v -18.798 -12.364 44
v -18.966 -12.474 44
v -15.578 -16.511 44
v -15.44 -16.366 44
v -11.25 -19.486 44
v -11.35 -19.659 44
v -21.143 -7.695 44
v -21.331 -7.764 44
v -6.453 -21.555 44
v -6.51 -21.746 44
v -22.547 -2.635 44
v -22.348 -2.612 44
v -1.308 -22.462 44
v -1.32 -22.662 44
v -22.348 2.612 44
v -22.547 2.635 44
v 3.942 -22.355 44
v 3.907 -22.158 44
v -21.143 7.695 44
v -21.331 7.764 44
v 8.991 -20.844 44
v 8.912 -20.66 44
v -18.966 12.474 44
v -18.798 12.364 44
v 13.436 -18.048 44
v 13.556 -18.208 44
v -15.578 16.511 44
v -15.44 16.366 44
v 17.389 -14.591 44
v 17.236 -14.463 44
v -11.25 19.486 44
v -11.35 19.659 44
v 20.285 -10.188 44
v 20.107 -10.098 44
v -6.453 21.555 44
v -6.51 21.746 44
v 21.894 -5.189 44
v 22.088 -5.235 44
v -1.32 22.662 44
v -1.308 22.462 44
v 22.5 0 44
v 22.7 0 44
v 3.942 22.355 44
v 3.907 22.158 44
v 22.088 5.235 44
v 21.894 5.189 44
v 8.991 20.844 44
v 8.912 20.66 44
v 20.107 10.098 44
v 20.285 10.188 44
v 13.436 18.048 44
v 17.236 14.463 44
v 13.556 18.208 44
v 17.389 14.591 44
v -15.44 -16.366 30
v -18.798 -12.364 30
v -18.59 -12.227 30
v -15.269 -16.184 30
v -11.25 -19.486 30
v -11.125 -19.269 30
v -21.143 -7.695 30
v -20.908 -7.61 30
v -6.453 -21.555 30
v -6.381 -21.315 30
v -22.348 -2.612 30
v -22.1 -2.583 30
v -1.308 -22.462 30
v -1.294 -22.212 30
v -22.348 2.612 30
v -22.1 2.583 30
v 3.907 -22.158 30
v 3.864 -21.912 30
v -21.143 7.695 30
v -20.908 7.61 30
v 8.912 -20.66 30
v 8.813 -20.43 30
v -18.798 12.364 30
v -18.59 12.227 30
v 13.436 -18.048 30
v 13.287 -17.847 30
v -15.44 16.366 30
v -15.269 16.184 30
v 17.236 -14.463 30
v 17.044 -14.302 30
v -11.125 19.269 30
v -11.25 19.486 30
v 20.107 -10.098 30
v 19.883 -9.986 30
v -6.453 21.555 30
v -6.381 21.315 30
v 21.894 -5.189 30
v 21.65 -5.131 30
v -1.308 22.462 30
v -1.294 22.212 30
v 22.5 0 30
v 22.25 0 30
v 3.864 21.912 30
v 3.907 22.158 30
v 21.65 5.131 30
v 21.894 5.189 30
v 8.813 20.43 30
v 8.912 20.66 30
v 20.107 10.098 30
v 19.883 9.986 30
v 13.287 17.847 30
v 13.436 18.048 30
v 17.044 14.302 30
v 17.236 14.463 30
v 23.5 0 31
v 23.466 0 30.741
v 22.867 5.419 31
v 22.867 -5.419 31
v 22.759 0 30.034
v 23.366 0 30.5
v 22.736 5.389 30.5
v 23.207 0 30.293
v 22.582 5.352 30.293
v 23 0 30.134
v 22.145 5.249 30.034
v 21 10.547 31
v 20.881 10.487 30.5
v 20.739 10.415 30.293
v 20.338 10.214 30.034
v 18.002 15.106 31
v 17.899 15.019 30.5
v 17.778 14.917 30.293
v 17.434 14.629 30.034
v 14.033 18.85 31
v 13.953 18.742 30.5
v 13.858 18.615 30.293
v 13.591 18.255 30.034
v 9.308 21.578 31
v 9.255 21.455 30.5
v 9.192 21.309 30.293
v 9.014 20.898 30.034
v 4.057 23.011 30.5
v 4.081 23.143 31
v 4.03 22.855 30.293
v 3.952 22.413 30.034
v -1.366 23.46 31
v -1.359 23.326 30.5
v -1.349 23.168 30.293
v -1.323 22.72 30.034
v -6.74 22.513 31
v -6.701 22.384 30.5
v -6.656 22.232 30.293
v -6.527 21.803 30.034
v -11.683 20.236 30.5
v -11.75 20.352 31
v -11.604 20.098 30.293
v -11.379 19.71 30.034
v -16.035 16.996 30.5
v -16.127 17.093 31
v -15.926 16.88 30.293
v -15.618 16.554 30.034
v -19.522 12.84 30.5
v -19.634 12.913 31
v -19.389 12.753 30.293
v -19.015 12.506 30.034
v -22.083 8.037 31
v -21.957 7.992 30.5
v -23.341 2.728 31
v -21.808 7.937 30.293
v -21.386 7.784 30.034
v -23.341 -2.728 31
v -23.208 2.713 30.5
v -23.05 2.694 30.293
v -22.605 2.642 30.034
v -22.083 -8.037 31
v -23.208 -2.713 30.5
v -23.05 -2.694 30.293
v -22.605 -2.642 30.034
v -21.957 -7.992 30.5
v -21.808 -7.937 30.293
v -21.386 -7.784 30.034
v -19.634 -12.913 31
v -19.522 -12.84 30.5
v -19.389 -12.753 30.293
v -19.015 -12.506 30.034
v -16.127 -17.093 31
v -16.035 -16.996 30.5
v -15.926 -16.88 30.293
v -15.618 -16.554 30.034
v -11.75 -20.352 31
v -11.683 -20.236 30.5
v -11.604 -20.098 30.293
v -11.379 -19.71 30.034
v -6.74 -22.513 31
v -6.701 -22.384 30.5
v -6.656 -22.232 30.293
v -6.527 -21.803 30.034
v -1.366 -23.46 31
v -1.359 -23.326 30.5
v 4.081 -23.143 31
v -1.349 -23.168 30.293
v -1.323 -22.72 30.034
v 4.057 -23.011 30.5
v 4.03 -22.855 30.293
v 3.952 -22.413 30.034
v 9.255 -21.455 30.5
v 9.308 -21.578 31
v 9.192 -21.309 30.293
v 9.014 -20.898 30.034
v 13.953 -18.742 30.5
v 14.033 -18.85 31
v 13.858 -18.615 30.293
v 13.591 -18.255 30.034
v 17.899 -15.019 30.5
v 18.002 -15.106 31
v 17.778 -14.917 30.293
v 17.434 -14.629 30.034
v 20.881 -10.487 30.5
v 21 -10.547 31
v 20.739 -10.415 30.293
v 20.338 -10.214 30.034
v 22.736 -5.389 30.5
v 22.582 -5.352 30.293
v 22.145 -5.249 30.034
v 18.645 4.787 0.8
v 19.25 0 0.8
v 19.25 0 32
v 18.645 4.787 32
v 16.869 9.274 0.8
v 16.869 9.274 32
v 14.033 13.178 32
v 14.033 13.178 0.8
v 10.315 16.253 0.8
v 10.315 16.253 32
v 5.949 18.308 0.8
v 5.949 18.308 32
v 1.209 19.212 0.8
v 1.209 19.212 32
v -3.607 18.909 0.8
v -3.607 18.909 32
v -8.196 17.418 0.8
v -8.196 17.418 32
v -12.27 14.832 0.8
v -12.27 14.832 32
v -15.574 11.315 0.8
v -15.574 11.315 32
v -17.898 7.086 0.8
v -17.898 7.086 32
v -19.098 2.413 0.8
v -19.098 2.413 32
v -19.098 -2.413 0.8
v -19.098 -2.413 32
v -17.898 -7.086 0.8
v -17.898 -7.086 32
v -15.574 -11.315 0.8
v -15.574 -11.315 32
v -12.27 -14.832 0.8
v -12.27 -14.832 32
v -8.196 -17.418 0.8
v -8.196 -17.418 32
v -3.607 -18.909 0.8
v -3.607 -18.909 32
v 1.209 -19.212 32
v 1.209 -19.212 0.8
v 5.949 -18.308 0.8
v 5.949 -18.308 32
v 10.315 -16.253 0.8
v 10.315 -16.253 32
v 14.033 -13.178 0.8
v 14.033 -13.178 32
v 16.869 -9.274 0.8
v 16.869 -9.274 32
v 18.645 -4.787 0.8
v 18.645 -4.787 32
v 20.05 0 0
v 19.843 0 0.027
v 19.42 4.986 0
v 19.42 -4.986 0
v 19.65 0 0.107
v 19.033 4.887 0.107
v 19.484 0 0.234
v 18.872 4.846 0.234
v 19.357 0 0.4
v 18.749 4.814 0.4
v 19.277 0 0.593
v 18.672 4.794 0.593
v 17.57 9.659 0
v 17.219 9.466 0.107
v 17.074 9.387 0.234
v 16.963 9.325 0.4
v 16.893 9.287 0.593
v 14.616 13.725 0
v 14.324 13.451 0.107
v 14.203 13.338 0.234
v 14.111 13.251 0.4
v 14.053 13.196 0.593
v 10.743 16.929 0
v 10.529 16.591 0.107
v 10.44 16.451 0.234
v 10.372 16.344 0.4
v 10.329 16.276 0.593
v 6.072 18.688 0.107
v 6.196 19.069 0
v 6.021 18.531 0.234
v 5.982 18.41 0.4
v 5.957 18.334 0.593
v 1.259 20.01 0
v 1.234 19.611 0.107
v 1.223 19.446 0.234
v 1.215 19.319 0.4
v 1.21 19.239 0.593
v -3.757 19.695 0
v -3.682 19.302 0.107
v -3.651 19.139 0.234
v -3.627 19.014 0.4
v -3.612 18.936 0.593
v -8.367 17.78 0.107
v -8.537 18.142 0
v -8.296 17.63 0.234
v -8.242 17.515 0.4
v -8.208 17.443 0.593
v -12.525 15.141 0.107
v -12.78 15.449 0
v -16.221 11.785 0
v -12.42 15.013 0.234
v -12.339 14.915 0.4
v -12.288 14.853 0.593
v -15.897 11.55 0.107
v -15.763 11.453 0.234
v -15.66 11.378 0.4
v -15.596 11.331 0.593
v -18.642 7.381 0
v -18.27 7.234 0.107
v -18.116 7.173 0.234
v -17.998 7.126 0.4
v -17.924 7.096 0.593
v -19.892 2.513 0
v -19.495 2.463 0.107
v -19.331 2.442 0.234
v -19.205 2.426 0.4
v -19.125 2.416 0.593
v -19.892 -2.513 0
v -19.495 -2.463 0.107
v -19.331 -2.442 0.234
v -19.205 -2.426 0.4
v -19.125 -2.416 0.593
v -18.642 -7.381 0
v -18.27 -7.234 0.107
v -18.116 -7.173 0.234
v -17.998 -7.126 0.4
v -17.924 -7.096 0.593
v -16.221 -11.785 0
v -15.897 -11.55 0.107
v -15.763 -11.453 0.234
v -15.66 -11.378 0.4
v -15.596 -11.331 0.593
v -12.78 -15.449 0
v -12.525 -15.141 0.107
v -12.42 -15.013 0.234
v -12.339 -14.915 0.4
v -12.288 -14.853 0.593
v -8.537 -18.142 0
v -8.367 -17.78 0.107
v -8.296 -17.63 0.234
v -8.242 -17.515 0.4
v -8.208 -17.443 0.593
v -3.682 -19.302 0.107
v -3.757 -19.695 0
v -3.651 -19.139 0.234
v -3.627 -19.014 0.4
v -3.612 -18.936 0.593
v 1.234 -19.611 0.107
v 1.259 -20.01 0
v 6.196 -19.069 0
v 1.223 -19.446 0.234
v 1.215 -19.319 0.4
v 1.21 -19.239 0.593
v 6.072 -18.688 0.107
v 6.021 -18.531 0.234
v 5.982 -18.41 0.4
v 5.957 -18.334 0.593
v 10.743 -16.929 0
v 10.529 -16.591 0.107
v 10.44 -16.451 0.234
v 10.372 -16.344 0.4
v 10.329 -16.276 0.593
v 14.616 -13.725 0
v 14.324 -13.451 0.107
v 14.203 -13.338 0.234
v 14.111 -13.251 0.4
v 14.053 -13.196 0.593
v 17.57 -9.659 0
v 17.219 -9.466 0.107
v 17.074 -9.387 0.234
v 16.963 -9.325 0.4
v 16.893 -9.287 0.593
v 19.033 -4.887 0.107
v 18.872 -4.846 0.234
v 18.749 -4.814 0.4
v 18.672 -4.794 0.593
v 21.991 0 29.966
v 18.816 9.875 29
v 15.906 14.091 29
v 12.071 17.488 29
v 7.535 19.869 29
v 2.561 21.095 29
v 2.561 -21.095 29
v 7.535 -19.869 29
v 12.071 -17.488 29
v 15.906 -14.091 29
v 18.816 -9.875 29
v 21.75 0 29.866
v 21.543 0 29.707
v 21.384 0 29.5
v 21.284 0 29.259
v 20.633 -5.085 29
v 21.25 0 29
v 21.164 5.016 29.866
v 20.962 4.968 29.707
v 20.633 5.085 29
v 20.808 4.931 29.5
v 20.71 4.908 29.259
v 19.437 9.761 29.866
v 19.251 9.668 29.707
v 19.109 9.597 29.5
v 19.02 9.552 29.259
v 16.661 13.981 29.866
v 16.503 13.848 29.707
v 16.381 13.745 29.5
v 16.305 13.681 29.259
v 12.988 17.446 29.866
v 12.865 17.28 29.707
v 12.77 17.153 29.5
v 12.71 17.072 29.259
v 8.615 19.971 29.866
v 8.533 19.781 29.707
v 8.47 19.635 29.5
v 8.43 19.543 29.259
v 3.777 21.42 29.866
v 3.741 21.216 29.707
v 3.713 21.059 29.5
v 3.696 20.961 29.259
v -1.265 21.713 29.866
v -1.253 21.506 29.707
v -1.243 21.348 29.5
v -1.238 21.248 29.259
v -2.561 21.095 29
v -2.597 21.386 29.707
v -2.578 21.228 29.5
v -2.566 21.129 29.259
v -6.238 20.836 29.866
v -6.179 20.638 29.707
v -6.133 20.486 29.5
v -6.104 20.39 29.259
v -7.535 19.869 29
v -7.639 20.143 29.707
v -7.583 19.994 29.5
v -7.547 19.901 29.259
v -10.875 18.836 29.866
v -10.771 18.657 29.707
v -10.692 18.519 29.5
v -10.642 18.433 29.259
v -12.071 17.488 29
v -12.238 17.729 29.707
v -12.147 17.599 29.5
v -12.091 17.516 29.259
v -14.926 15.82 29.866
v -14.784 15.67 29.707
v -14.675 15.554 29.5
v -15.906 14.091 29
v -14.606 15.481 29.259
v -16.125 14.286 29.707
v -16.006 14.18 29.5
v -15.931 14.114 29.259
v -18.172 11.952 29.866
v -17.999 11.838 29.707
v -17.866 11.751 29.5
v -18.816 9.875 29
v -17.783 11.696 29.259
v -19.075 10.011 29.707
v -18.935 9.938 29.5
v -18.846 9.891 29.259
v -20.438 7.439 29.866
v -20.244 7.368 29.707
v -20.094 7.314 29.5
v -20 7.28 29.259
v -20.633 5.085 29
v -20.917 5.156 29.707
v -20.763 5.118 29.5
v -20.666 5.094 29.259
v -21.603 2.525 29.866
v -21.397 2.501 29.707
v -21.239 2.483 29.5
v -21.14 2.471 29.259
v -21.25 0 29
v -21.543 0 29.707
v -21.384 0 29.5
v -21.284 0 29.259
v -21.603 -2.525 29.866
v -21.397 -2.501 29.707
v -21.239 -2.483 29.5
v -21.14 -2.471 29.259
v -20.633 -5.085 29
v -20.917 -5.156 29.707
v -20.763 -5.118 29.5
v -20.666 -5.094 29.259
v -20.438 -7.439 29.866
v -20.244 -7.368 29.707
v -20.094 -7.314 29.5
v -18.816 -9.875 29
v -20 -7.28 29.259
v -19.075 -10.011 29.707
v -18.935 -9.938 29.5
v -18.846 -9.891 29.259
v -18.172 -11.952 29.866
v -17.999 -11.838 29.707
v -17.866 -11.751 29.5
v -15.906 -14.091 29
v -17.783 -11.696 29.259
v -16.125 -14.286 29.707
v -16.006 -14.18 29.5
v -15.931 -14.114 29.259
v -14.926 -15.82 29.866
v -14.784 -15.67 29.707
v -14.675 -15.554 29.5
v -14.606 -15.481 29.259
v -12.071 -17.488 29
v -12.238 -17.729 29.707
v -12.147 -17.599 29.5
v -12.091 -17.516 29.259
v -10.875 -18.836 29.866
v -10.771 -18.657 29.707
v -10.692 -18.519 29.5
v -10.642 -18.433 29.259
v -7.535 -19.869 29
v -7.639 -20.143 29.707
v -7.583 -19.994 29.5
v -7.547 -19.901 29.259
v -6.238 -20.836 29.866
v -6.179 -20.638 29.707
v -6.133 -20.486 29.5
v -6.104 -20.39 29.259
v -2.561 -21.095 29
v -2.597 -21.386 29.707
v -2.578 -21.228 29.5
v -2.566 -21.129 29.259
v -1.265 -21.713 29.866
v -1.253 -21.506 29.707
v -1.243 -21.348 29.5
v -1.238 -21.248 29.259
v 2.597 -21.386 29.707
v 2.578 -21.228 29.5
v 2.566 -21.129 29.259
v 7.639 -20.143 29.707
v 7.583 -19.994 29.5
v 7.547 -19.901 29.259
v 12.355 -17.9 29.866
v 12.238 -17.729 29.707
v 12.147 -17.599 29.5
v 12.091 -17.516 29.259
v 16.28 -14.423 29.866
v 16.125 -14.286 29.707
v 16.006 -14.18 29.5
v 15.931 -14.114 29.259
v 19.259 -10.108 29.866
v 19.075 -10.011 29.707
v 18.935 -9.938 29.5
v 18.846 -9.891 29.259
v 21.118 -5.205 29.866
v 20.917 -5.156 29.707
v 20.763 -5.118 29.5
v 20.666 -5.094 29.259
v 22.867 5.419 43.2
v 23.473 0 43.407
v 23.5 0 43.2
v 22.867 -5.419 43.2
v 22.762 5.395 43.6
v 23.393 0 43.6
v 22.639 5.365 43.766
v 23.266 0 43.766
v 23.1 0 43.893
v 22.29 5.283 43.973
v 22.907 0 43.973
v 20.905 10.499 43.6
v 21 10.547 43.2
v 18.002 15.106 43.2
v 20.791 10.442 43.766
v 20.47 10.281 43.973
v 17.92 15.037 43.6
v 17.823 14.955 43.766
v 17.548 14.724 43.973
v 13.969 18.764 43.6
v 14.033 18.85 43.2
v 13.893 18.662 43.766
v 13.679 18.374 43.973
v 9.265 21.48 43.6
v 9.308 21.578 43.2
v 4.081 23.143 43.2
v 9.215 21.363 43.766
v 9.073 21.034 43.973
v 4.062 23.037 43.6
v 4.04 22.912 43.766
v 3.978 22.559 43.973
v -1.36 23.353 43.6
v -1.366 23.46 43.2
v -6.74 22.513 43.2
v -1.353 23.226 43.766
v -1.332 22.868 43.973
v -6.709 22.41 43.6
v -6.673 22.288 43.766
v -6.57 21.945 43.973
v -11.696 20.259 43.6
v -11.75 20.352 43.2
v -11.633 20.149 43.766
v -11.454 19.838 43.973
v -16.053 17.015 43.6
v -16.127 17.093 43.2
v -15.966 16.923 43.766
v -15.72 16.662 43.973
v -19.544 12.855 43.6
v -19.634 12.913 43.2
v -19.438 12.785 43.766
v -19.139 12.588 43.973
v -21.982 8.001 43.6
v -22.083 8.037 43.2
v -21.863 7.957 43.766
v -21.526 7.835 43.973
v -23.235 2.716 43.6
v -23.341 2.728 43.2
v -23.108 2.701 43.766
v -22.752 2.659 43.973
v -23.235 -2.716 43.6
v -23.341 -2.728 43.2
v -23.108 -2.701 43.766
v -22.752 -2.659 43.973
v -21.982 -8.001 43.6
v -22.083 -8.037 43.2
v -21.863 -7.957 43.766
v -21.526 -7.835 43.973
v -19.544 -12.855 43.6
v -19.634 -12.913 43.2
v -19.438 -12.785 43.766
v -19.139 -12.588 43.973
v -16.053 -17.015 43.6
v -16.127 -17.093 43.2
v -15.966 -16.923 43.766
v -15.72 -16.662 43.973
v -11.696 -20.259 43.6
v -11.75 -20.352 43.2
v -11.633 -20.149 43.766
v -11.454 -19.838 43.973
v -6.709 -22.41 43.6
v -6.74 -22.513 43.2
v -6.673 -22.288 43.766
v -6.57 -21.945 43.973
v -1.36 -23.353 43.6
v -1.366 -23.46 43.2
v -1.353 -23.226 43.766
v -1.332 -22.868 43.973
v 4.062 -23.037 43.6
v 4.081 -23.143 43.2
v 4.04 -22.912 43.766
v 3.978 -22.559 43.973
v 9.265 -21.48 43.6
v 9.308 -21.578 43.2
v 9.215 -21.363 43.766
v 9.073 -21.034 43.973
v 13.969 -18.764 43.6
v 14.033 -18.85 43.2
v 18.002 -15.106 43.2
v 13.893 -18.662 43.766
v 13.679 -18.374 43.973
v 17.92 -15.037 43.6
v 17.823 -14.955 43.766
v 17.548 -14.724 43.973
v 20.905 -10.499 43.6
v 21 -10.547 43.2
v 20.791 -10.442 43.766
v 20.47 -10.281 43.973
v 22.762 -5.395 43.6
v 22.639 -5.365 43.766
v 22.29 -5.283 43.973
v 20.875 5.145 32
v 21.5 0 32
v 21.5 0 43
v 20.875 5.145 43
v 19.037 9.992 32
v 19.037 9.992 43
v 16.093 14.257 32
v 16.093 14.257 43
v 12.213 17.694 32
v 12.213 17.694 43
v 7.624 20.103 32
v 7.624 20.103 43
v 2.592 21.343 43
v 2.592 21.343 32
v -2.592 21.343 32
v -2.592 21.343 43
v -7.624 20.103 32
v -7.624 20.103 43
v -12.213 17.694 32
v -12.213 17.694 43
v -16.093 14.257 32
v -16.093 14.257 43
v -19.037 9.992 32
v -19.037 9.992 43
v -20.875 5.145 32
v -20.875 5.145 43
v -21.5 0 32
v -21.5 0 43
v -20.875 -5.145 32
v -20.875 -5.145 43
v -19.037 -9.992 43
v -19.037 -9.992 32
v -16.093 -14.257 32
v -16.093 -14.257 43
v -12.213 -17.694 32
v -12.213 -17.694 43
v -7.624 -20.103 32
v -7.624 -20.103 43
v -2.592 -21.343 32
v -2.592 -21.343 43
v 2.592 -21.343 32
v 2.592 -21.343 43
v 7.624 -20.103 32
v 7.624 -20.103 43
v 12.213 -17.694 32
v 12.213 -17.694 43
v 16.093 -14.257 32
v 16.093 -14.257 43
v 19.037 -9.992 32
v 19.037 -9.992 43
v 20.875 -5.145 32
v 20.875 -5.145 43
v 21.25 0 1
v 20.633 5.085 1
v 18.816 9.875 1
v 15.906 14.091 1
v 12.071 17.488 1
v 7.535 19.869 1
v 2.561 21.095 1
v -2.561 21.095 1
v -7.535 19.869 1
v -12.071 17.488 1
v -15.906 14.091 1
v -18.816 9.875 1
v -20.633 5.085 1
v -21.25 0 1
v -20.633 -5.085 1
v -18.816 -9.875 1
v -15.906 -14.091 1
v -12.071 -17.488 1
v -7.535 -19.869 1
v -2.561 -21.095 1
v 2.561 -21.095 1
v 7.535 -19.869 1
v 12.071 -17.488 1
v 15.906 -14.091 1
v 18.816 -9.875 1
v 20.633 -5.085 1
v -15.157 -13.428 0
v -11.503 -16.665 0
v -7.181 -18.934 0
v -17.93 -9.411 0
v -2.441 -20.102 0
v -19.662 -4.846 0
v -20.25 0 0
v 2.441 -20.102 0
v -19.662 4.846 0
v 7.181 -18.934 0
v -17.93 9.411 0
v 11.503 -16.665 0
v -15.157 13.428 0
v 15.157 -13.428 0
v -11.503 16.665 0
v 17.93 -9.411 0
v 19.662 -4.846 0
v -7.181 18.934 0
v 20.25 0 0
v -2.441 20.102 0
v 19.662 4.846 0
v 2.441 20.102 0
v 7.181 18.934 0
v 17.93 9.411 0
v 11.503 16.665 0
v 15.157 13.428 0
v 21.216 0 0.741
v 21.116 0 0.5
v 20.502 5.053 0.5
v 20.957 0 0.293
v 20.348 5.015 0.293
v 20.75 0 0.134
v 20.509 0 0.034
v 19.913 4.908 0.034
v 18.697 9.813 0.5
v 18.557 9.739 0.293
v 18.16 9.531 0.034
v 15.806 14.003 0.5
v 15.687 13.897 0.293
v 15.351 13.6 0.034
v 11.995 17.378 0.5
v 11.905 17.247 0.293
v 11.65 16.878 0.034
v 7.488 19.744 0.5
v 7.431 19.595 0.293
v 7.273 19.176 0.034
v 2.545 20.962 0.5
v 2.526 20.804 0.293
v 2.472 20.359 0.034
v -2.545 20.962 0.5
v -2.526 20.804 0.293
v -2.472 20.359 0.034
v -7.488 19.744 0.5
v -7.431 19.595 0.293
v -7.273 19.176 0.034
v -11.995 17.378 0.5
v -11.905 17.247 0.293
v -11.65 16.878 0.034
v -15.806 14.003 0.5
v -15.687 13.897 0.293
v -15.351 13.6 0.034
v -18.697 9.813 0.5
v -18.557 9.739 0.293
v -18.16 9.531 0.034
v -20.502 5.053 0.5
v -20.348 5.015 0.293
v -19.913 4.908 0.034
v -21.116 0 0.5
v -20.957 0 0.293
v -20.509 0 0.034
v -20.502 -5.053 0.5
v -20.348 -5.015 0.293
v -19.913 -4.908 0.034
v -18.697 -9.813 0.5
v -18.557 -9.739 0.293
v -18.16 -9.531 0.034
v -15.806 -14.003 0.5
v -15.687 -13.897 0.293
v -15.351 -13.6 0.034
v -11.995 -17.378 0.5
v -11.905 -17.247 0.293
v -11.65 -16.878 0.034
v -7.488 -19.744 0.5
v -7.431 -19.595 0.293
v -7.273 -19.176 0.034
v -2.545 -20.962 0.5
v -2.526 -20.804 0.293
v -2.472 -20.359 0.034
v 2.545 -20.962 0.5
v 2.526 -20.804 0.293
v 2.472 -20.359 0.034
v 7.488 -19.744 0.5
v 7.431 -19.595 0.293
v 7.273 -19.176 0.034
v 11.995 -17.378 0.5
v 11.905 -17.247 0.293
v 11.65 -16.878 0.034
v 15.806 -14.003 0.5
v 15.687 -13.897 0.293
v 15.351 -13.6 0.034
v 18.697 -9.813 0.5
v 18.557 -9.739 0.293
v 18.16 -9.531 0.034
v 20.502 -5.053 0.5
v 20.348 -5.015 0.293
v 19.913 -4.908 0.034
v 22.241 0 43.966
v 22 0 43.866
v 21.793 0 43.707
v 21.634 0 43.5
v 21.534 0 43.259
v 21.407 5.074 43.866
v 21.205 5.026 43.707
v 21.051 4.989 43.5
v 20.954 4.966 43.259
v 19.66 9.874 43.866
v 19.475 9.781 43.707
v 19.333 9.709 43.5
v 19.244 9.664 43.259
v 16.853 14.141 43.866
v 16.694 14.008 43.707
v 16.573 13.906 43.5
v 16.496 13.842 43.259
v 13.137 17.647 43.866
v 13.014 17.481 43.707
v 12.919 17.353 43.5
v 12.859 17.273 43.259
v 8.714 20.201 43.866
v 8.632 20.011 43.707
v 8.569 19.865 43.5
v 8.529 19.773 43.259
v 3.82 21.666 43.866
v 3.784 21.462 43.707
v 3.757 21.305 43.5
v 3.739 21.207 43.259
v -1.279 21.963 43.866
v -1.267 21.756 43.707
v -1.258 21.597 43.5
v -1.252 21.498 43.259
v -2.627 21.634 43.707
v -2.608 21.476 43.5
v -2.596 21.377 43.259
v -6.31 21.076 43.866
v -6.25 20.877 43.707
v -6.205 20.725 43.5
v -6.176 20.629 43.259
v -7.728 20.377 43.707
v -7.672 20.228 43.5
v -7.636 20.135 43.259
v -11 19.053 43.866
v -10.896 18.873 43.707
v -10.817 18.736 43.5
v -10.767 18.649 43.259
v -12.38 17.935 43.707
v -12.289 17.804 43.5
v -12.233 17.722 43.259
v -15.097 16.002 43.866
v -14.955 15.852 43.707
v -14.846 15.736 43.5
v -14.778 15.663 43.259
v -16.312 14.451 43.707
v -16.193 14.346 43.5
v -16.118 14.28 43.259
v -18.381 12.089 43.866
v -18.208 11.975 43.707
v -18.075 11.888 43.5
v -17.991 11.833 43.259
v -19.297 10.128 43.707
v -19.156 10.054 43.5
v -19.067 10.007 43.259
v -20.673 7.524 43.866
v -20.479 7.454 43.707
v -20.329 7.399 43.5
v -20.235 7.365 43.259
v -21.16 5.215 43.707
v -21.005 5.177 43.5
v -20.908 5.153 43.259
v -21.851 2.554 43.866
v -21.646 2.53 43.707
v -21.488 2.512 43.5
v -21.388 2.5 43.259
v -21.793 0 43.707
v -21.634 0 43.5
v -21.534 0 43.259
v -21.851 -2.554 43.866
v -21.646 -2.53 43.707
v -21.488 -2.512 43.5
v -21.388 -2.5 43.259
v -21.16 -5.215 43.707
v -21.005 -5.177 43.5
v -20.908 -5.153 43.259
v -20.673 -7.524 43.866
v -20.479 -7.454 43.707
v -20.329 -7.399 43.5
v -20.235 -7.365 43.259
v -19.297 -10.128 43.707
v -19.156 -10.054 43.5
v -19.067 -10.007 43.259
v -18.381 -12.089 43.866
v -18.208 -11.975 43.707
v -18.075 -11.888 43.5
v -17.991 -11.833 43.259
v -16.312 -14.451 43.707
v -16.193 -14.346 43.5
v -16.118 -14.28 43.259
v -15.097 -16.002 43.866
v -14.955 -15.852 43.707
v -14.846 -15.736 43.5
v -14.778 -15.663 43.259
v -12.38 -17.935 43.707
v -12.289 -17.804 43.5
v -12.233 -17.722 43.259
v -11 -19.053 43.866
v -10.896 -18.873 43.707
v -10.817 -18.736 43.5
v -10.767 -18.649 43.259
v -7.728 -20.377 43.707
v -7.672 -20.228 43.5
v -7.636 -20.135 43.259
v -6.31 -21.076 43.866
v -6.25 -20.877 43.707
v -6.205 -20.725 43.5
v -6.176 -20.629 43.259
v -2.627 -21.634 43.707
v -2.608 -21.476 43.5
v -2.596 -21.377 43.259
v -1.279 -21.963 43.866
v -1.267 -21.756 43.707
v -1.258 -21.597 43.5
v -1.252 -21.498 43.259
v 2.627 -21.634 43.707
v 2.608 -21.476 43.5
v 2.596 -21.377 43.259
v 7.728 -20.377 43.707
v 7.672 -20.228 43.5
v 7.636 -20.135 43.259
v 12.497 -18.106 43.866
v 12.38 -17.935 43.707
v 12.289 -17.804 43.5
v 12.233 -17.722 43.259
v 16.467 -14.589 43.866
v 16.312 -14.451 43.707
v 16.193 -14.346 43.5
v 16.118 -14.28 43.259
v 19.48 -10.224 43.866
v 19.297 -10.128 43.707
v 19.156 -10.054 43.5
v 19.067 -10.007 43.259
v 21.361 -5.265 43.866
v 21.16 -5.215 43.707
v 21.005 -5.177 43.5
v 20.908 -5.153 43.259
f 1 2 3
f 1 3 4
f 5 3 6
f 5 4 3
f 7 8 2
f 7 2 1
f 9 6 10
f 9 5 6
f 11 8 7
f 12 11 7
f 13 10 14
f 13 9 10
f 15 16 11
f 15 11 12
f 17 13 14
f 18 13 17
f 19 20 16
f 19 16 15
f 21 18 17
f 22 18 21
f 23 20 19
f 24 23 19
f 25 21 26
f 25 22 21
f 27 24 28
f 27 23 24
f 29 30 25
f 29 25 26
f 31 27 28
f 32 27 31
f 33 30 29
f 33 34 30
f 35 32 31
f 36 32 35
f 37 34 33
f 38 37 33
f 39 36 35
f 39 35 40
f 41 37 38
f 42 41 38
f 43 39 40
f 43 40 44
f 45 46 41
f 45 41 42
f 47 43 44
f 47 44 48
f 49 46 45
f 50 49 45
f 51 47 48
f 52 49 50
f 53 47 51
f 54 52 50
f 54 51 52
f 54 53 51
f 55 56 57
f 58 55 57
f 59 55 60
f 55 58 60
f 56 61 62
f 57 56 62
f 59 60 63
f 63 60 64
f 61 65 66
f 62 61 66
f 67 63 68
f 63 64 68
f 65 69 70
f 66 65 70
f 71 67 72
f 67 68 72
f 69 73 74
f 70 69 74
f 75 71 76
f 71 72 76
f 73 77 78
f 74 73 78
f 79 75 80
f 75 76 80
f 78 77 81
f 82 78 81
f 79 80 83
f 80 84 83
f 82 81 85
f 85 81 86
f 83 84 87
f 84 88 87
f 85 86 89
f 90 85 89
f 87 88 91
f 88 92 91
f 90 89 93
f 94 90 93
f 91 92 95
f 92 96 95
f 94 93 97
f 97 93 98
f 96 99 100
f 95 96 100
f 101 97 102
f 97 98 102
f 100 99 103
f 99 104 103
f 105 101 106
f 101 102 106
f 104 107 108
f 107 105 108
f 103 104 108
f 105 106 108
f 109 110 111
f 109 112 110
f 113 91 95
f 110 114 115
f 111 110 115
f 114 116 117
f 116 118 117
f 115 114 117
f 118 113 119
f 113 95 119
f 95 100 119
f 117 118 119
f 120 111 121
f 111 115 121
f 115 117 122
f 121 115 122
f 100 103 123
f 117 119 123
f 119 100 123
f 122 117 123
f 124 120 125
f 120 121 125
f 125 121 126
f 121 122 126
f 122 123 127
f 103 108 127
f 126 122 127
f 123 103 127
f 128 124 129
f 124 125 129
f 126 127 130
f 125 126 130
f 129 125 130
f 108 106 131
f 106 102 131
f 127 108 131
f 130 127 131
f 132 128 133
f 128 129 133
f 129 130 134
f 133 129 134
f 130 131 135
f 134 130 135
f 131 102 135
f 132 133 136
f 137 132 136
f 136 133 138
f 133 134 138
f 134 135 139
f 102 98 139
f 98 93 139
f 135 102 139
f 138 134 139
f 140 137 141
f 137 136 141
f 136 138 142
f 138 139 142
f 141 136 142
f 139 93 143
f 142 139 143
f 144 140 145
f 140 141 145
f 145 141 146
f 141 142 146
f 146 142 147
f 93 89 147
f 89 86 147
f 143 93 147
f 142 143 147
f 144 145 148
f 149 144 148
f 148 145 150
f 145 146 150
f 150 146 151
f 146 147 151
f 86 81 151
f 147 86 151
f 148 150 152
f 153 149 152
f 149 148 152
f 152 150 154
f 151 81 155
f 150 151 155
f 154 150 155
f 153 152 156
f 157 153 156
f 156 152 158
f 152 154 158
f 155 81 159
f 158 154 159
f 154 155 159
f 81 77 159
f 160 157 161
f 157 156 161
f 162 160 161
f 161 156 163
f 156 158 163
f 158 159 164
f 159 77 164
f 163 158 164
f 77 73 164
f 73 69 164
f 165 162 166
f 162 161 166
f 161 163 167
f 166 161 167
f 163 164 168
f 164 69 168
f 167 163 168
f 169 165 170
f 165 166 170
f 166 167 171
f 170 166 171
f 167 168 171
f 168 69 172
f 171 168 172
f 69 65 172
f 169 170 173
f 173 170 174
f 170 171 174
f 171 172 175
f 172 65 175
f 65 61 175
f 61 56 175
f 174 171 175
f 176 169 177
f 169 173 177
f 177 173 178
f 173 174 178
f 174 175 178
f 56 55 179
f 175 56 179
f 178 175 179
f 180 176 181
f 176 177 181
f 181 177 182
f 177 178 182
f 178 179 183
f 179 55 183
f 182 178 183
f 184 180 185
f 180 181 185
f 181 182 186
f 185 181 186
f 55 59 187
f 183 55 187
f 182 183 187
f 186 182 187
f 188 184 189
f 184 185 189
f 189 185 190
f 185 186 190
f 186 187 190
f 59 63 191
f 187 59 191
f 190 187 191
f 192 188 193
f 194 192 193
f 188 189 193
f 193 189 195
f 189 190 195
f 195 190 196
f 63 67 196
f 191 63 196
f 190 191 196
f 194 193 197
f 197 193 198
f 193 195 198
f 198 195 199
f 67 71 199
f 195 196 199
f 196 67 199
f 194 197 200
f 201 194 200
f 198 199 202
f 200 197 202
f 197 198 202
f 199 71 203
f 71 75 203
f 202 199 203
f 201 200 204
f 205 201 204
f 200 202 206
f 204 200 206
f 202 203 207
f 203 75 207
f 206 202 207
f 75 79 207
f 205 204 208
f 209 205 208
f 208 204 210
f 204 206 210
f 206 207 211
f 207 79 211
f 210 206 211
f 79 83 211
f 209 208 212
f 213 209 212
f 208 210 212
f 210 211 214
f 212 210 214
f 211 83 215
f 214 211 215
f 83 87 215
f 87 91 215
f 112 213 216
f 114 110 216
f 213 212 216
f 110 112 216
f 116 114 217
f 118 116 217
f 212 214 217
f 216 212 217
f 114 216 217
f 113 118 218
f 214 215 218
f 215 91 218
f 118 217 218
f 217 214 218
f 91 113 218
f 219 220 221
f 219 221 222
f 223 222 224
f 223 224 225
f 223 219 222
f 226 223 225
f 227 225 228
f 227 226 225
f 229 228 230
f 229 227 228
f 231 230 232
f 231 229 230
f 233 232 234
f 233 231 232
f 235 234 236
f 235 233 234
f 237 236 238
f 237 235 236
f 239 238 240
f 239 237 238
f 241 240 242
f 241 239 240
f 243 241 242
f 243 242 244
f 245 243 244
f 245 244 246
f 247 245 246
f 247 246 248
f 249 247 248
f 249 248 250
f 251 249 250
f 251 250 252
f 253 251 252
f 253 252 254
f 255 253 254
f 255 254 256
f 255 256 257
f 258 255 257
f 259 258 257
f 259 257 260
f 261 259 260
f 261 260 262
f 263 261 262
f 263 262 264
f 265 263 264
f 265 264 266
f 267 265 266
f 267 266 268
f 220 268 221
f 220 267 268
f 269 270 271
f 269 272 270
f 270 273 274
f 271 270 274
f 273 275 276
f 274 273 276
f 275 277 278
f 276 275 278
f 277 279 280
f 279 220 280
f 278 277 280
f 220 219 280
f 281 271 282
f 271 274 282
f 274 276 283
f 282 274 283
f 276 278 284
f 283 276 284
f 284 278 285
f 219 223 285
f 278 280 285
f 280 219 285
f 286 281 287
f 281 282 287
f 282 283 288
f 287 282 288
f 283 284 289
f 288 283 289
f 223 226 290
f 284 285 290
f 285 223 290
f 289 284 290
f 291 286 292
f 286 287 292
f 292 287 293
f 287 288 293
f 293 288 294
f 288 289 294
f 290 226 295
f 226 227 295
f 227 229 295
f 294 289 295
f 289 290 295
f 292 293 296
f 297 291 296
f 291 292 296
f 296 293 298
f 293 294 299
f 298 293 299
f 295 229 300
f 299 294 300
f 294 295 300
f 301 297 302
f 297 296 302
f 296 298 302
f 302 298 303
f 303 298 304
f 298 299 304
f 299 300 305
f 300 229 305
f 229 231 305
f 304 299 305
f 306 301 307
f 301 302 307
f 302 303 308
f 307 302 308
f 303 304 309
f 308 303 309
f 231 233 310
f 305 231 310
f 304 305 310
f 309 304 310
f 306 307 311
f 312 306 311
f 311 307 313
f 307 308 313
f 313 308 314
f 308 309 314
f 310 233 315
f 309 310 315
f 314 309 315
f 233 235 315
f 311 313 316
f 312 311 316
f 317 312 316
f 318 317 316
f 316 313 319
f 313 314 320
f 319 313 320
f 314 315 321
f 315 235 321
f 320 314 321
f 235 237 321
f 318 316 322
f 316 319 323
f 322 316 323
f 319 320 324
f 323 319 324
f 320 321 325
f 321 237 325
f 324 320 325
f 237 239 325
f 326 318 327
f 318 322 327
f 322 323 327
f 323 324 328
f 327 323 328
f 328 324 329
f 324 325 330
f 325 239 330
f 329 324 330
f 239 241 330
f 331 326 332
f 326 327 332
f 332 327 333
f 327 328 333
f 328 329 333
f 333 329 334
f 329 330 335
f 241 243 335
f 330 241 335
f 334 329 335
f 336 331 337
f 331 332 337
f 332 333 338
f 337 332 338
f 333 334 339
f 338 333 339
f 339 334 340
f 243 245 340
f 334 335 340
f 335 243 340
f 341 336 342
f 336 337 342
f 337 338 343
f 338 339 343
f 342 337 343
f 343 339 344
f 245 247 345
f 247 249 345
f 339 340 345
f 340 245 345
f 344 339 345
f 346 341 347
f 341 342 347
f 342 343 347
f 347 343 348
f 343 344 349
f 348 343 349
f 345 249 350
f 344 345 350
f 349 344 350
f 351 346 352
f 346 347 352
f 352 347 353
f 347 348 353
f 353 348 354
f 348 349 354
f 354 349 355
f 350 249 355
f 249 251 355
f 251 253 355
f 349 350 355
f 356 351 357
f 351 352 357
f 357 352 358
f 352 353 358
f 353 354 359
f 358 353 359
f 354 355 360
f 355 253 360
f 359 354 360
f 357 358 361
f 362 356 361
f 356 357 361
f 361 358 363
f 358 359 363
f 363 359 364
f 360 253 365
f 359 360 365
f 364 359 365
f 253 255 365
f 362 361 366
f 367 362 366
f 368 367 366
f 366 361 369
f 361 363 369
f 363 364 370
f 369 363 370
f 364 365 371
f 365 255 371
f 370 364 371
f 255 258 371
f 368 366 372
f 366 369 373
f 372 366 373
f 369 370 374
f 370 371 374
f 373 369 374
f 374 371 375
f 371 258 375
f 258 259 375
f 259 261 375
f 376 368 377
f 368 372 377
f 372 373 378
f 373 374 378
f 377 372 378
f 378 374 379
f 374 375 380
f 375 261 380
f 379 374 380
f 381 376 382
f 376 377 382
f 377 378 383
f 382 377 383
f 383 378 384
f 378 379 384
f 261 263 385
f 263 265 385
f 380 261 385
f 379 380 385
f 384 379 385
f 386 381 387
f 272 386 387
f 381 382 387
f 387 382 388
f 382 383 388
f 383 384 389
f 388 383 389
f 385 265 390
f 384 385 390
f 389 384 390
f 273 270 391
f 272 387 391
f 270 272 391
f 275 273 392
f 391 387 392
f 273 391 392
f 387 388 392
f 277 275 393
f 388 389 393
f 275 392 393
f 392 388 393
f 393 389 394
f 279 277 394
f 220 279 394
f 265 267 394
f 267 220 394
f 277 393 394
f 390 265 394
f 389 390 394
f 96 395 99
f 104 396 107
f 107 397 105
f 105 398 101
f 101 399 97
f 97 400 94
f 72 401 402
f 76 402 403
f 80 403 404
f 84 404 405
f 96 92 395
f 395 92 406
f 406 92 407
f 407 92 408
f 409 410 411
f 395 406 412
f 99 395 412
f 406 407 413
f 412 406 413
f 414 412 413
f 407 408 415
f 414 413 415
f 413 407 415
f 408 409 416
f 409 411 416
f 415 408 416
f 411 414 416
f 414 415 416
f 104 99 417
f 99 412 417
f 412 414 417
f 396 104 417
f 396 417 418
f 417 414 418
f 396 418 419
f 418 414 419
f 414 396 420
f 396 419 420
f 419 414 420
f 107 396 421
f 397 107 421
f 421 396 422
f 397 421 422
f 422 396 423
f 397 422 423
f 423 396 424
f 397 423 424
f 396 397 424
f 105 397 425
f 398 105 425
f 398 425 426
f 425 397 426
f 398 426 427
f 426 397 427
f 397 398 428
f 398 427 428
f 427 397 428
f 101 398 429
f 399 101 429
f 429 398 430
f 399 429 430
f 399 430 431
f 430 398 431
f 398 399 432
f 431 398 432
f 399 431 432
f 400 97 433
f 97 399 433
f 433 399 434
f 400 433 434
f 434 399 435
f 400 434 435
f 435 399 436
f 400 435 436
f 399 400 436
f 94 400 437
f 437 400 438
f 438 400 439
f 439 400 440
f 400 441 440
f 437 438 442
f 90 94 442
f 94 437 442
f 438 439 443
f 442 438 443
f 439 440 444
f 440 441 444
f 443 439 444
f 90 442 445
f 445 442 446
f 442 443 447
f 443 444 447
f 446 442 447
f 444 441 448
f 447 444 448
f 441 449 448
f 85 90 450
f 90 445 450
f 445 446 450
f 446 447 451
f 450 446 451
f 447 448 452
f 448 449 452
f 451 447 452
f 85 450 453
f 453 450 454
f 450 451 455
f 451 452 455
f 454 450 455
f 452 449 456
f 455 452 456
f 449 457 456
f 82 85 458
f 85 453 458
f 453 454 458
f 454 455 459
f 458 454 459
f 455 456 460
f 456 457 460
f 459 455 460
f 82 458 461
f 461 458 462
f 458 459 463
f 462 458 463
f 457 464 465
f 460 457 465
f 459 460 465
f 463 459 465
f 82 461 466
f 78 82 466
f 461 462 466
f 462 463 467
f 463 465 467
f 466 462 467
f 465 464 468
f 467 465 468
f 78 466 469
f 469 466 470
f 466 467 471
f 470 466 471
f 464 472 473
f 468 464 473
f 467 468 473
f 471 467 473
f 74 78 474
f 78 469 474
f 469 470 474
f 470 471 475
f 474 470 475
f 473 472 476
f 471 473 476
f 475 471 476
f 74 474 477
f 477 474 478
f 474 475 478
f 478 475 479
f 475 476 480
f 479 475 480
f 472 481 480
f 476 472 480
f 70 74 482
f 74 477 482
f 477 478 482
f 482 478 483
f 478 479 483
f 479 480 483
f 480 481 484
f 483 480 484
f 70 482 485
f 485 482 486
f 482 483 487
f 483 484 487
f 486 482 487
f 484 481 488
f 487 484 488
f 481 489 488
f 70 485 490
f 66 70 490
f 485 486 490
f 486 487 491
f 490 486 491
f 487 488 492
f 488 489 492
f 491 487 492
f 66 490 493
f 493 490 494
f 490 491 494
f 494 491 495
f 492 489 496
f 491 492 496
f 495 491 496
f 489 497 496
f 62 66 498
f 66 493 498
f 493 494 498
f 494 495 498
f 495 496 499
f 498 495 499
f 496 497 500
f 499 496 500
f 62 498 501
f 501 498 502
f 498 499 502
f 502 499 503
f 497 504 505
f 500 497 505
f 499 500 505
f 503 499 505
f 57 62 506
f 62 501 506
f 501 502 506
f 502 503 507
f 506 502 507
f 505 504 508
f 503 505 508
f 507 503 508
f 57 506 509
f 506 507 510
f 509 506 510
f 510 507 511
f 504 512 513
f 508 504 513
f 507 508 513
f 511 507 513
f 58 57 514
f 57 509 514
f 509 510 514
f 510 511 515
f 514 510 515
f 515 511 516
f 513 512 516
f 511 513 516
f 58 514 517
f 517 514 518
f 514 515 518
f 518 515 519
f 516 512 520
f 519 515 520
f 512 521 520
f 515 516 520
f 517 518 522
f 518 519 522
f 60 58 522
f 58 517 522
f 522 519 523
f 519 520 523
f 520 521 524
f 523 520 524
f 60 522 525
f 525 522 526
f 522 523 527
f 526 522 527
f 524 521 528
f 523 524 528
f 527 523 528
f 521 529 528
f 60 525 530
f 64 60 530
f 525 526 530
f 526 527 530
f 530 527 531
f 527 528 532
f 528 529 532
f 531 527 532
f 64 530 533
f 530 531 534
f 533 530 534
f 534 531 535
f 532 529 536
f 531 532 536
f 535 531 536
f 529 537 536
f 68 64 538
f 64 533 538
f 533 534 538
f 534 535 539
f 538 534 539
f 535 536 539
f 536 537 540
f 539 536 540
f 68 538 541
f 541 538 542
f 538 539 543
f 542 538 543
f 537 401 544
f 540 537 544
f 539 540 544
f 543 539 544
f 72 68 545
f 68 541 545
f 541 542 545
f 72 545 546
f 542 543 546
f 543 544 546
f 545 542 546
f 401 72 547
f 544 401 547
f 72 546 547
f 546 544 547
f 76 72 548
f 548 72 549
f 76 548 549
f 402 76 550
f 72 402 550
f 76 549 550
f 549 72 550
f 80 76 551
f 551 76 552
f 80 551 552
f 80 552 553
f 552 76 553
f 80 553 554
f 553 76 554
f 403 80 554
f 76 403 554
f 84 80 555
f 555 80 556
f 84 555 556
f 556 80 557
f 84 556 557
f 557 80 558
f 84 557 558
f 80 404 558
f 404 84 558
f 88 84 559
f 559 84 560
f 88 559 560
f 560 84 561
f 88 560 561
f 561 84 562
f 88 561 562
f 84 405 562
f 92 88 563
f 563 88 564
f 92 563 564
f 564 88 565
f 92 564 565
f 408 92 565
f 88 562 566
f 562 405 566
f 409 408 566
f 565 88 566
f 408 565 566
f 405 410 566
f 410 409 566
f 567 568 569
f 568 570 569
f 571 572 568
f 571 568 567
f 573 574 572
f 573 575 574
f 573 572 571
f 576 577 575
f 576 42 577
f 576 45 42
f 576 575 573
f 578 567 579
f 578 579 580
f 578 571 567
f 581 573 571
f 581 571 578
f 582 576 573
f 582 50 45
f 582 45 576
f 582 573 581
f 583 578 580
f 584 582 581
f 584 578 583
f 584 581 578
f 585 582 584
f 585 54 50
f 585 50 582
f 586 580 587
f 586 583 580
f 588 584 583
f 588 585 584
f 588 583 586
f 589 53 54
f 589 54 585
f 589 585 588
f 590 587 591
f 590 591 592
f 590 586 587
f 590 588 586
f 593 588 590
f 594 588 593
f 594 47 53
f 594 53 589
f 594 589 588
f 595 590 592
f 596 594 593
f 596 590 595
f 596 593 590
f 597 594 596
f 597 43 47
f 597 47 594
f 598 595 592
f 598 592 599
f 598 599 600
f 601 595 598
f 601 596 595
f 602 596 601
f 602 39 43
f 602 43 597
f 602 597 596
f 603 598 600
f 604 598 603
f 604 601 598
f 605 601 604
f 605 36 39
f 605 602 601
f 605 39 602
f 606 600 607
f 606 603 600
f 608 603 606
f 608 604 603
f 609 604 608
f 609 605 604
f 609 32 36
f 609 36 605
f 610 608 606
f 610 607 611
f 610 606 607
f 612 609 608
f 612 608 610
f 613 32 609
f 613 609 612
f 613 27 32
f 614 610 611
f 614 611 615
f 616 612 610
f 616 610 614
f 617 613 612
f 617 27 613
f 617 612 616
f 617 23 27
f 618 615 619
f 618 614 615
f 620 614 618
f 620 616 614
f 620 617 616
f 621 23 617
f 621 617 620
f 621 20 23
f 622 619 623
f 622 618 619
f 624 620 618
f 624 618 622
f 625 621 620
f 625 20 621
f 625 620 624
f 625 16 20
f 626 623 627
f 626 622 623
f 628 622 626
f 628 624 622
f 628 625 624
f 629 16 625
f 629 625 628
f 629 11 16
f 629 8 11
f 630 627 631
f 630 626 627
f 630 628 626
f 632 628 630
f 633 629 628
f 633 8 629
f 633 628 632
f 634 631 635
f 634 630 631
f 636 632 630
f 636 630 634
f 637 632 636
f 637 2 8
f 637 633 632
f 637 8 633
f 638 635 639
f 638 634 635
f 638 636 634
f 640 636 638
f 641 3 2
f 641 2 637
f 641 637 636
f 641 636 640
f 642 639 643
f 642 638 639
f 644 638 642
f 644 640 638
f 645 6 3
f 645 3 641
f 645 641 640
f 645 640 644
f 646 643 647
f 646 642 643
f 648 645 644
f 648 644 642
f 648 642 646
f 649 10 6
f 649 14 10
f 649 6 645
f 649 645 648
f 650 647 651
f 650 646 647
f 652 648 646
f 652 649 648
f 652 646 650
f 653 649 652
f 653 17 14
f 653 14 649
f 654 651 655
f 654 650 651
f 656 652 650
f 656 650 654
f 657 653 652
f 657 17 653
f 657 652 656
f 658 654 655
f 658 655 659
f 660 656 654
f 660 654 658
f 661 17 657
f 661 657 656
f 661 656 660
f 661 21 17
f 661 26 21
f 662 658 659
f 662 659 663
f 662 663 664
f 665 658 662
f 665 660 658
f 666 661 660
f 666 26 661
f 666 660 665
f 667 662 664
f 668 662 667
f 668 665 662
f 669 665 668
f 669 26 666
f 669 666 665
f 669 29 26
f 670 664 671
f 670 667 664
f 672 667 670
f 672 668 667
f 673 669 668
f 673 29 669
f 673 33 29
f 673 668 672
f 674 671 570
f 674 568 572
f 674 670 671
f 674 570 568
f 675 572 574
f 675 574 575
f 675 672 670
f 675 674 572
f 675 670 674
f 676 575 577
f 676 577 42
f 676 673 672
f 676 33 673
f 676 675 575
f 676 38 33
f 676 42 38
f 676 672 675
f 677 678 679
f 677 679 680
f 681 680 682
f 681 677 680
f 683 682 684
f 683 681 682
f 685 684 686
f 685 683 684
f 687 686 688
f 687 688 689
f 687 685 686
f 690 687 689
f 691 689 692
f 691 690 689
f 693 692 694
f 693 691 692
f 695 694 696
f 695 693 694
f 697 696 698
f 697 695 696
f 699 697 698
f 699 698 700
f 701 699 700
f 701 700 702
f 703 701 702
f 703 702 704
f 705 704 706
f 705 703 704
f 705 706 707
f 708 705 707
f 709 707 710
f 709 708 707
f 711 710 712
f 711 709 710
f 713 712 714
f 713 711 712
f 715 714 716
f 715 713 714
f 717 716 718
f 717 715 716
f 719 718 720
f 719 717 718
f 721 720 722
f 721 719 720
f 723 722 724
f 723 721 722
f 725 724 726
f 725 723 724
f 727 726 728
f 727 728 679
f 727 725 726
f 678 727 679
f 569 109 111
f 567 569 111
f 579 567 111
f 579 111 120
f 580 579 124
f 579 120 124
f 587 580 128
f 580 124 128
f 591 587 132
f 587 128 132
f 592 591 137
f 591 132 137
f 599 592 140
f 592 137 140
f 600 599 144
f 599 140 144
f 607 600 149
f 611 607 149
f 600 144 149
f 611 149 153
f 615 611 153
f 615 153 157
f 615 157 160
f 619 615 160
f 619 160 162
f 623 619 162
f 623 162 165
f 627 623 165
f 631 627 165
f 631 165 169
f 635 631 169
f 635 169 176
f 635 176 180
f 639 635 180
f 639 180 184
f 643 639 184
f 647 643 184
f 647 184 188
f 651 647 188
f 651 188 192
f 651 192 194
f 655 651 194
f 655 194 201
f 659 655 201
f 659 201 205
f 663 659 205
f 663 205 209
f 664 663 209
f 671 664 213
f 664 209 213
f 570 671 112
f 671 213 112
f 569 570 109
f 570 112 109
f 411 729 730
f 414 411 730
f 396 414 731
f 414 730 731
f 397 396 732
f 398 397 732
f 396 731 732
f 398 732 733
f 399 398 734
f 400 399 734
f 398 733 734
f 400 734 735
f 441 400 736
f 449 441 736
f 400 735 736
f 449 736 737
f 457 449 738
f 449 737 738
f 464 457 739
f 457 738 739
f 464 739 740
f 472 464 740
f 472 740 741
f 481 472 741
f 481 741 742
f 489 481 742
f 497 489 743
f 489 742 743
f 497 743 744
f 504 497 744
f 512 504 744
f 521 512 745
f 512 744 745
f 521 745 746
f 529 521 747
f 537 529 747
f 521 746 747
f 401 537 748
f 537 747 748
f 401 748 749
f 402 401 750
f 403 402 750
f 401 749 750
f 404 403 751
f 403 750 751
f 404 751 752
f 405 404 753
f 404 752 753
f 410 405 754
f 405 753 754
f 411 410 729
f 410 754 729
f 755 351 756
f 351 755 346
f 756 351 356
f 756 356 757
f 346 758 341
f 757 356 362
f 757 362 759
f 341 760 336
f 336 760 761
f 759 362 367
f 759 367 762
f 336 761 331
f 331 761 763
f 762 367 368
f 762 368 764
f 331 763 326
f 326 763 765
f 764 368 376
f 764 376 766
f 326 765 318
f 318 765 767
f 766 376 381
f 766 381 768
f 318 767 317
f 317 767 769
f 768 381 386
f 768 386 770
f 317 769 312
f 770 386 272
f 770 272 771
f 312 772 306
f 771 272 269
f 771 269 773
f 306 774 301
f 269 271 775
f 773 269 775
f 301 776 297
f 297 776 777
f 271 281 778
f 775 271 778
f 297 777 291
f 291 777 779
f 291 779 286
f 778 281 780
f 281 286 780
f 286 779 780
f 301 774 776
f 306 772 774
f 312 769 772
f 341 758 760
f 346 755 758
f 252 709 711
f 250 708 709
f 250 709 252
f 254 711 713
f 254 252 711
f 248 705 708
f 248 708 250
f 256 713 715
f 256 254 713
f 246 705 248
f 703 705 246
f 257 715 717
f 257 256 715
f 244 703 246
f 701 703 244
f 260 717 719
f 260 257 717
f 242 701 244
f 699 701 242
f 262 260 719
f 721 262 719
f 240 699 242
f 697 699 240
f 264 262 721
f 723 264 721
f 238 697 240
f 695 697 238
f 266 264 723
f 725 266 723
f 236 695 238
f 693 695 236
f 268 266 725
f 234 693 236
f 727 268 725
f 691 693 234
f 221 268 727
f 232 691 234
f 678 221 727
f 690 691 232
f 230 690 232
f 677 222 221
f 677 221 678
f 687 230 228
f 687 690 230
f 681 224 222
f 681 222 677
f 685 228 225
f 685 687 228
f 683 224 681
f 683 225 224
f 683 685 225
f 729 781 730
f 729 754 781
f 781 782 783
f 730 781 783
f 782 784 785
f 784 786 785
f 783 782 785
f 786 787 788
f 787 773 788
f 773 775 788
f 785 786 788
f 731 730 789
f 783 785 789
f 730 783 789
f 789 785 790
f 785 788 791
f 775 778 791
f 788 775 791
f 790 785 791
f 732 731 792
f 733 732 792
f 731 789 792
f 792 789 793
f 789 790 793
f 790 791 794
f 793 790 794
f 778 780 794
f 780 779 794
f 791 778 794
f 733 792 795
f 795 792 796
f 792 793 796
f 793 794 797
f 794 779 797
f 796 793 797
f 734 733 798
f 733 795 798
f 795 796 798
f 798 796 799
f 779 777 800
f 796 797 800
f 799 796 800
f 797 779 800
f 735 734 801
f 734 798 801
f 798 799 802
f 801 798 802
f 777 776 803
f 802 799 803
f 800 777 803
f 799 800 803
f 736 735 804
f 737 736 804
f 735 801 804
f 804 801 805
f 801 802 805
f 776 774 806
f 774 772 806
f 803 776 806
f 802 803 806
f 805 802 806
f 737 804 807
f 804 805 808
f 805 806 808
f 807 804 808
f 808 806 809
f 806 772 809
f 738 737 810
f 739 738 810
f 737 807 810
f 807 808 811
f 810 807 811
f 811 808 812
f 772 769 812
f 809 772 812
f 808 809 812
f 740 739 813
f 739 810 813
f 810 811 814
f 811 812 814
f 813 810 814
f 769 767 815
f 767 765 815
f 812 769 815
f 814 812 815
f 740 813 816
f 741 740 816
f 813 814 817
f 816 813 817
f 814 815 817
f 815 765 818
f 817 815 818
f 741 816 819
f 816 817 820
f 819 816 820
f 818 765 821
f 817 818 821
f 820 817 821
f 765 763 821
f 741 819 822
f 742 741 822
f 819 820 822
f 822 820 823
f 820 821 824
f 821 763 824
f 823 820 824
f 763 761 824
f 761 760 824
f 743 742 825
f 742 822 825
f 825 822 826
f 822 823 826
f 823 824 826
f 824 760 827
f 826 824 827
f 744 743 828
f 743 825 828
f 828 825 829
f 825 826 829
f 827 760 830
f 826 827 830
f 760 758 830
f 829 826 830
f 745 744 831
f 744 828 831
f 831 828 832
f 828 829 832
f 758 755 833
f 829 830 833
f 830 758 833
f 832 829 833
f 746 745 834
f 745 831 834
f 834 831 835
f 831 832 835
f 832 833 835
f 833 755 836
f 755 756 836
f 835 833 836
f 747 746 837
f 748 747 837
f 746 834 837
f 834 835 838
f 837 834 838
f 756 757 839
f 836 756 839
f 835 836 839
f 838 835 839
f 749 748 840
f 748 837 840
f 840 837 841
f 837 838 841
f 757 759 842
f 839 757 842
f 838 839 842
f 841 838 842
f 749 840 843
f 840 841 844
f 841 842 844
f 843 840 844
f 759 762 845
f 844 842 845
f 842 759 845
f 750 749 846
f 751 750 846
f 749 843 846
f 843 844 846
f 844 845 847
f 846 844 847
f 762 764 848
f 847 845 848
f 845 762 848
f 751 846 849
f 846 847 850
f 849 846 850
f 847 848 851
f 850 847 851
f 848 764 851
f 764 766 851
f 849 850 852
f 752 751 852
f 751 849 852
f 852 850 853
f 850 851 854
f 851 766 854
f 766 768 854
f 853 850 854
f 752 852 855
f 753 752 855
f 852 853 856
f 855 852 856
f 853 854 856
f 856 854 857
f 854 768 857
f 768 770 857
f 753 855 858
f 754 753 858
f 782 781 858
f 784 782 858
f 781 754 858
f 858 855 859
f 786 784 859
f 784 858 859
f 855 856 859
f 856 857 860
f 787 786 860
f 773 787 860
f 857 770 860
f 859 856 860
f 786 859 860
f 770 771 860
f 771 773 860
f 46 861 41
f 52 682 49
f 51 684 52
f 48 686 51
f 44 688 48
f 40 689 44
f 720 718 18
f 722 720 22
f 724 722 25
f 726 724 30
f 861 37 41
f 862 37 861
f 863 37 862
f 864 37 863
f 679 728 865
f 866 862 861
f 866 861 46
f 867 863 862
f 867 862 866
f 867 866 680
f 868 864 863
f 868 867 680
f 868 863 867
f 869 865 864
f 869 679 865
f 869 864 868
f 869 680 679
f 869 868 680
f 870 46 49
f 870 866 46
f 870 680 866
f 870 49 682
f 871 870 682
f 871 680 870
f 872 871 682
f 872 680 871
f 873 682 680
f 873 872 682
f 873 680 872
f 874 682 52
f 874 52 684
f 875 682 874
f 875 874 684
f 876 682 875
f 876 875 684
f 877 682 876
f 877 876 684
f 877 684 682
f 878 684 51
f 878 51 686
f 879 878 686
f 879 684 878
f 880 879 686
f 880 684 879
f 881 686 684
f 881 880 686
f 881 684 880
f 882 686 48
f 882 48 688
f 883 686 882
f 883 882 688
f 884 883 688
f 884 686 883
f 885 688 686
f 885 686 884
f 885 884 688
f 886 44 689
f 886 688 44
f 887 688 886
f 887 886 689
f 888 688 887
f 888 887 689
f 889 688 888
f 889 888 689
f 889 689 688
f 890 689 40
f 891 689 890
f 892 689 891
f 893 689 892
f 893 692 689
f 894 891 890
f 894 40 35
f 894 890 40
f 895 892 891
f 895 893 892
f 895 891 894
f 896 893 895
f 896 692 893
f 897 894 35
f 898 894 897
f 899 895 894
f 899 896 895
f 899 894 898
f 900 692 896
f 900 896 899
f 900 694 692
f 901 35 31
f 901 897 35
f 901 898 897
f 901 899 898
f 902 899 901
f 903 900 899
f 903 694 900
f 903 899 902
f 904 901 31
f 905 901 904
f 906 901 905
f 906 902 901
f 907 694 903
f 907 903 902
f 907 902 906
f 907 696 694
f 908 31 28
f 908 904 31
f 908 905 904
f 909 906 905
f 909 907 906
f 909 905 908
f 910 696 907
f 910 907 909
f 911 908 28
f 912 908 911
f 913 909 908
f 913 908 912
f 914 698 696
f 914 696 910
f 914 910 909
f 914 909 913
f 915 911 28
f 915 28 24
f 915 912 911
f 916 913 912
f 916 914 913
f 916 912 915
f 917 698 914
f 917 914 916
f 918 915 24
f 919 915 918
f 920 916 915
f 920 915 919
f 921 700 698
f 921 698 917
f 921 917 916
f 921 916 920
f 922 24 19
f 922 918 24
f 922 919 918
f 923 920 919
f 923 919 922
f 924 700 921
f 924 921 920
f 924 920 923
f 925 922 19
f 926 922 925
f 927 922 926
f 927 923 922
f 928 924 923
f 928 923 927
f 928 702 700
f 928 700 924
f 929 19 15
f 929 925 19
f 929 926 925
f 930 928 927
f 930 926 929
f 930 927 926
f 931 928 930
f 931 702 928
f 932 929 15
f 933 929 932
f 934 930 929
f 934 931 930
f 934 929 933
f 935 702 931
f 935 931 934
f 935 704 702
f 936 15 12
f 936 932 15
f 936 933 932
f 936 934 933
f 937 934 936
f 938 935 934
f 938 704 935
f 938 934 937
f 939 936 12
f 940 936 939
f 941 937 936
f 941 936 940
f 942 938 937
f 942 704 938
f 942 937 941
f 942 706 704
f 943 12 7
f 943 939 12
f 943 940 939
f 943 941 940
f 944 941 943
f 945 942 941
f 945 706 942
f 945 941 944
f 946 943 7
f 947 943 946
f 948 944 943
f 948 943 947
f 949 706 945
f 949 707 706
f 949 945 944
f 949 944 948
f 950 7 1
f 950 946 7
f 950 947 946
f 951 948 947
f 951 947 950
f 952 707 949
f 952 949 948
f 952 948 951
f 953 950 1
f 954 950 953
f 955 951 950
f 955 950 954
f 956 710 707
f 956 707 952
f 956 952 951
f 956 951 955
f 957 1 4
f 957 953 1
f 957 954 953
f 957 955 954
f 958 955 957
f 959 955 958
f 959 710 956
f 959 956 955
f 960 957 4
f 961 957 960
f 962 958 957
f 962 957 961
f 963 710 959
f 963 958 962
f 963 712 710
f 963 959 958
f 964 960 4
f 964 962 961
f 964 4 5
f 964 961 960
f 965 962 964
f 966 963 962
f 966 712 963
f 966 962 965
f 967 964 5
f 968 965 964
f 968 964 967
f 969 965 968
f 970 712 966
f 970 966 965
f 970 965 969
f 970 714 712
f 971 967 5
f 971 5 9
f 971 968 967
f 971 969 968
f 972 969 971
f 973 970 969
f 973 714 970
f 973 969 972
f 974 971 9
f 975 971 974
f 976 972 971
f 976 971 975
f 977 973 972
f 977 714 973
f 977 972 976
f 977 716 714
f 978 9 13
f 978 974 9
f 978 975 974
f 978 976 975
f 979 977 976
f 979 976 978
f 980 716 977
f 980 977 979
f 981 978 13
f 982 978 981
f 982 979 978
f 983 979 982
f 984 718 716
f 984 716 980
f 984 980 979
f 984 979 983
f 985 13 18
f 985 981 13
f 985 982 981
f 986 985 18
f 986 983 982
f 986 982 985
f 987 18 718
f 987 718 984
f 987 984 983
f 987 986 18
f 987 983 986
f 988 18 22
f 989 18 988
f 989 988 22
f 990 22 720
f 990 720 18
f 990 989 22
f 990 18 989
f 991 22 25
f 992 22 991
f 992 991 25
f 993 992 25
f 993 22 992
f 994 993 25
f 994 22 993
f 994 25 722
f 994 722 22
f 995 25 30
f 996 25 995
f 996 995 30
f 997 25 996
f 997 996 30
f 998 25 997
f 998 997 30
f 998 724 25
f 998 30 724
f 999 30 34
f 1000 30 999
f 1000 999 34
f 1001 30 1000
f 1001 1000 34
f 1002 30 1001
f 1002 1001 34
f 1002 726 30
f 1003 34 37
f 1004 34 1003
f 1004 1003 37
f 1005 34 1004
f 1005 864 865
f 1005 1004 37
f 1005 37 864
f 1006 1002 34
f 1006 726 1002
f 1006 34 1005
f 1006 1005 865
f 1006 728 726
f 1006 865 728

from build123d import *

# Parameters (mm, degrees)
SKETCH_R      = 21.25
SKETCH_R_2    = 19.25
PAD_DEPTH     = 30
SKETCH001_R   = 23.5
SKETCH001_R_2 = 19.25
PAD001_DEPTH  = 2
SKETCH002_R   = 23.5
SKETCH002_R_2 = 21.5
PAD002_DEPTH  = 12
FILLET_R      = 0.8
FILLET001_R   = 1
FILLET002_R   = 1
FILLET003_R   = 1
FILLET004_R   = 1
FILLET005_R   = 0.8


with BuildPart() as part:
    # Sketch → Pad (new body)
    with BuildSketch(Plane.XY):
        Circle(SKETCH_R)
        Circle(SKETCH_R_2, mode=Mode.SUBTRACT)
    extrude(amount=PAD_DEPTH)

    # Sketch001 (on Face4 of Pad) → Pad001 (join)
    with BuildSketch(Plane.XY.offset(30)):
        Circle(SKETCH001_R)
        Circle(SKETCH001_R_2, mode=Mode.SUBTRACT)
    extrude(amount=PAD001_DEPTH)

    # Sketch002 (on Face7 of Pad001) → Pad002 (join)
    with BuildSketch(Plane.XY.offset(32)):
        Circle(SKETCH002_R)
        Circle(SKETCH002_R_2, mode=Mode.SUBTRACT)
    extrude(amount=PAD002_DEPTH)

    # Fillet
    fillet_edges = [part.edges().sort_by_distance(p)[0] for p in [
        (-23.5, 0, 44),
    ]]
    fillet(fillet_edges, radius=FILLET_R)

    # Fillet001
    fillet001_edges = [part.edges().sort_by_distance(p)[0] for p in [
        (-21.5, 0, 44),
    ]]
    fillet(fillet001_edges, radius=FILLET001_R)

    # Fillet002
    fillet002_edges = [part.edges().sort_by_distance(p)[0] for p in [
        (-23.5, 0, 30),
    ]]
    fillet(fillet002_edges, radius=FILLET002_R)

    # Fillet003
    fillet003_edges = [part.edges().sort_by_distance(p)[0] for p in [
        (-21.25, 0, 30),
    ]]
    fillet(fillet003_edges, radius=FILLET003_R)

    # Fillet004
    fillet004_edges = [part.edges().sort_by_distance(p)[0] for p in [
        (-21.25, 0, 0),
    ]]
    fillet(fillet004_edges, radius=FILLET004_R)

    # Fillet005
    fillet005_edges = [part.edges().sort_by_distance(p)[0] for p in [
        (-20.25, 0, 0),
        (-19.25, 0, 0),
    ]]
    fillet(fillet005_edges, radius=FILLET005_R)


solid = part.part
